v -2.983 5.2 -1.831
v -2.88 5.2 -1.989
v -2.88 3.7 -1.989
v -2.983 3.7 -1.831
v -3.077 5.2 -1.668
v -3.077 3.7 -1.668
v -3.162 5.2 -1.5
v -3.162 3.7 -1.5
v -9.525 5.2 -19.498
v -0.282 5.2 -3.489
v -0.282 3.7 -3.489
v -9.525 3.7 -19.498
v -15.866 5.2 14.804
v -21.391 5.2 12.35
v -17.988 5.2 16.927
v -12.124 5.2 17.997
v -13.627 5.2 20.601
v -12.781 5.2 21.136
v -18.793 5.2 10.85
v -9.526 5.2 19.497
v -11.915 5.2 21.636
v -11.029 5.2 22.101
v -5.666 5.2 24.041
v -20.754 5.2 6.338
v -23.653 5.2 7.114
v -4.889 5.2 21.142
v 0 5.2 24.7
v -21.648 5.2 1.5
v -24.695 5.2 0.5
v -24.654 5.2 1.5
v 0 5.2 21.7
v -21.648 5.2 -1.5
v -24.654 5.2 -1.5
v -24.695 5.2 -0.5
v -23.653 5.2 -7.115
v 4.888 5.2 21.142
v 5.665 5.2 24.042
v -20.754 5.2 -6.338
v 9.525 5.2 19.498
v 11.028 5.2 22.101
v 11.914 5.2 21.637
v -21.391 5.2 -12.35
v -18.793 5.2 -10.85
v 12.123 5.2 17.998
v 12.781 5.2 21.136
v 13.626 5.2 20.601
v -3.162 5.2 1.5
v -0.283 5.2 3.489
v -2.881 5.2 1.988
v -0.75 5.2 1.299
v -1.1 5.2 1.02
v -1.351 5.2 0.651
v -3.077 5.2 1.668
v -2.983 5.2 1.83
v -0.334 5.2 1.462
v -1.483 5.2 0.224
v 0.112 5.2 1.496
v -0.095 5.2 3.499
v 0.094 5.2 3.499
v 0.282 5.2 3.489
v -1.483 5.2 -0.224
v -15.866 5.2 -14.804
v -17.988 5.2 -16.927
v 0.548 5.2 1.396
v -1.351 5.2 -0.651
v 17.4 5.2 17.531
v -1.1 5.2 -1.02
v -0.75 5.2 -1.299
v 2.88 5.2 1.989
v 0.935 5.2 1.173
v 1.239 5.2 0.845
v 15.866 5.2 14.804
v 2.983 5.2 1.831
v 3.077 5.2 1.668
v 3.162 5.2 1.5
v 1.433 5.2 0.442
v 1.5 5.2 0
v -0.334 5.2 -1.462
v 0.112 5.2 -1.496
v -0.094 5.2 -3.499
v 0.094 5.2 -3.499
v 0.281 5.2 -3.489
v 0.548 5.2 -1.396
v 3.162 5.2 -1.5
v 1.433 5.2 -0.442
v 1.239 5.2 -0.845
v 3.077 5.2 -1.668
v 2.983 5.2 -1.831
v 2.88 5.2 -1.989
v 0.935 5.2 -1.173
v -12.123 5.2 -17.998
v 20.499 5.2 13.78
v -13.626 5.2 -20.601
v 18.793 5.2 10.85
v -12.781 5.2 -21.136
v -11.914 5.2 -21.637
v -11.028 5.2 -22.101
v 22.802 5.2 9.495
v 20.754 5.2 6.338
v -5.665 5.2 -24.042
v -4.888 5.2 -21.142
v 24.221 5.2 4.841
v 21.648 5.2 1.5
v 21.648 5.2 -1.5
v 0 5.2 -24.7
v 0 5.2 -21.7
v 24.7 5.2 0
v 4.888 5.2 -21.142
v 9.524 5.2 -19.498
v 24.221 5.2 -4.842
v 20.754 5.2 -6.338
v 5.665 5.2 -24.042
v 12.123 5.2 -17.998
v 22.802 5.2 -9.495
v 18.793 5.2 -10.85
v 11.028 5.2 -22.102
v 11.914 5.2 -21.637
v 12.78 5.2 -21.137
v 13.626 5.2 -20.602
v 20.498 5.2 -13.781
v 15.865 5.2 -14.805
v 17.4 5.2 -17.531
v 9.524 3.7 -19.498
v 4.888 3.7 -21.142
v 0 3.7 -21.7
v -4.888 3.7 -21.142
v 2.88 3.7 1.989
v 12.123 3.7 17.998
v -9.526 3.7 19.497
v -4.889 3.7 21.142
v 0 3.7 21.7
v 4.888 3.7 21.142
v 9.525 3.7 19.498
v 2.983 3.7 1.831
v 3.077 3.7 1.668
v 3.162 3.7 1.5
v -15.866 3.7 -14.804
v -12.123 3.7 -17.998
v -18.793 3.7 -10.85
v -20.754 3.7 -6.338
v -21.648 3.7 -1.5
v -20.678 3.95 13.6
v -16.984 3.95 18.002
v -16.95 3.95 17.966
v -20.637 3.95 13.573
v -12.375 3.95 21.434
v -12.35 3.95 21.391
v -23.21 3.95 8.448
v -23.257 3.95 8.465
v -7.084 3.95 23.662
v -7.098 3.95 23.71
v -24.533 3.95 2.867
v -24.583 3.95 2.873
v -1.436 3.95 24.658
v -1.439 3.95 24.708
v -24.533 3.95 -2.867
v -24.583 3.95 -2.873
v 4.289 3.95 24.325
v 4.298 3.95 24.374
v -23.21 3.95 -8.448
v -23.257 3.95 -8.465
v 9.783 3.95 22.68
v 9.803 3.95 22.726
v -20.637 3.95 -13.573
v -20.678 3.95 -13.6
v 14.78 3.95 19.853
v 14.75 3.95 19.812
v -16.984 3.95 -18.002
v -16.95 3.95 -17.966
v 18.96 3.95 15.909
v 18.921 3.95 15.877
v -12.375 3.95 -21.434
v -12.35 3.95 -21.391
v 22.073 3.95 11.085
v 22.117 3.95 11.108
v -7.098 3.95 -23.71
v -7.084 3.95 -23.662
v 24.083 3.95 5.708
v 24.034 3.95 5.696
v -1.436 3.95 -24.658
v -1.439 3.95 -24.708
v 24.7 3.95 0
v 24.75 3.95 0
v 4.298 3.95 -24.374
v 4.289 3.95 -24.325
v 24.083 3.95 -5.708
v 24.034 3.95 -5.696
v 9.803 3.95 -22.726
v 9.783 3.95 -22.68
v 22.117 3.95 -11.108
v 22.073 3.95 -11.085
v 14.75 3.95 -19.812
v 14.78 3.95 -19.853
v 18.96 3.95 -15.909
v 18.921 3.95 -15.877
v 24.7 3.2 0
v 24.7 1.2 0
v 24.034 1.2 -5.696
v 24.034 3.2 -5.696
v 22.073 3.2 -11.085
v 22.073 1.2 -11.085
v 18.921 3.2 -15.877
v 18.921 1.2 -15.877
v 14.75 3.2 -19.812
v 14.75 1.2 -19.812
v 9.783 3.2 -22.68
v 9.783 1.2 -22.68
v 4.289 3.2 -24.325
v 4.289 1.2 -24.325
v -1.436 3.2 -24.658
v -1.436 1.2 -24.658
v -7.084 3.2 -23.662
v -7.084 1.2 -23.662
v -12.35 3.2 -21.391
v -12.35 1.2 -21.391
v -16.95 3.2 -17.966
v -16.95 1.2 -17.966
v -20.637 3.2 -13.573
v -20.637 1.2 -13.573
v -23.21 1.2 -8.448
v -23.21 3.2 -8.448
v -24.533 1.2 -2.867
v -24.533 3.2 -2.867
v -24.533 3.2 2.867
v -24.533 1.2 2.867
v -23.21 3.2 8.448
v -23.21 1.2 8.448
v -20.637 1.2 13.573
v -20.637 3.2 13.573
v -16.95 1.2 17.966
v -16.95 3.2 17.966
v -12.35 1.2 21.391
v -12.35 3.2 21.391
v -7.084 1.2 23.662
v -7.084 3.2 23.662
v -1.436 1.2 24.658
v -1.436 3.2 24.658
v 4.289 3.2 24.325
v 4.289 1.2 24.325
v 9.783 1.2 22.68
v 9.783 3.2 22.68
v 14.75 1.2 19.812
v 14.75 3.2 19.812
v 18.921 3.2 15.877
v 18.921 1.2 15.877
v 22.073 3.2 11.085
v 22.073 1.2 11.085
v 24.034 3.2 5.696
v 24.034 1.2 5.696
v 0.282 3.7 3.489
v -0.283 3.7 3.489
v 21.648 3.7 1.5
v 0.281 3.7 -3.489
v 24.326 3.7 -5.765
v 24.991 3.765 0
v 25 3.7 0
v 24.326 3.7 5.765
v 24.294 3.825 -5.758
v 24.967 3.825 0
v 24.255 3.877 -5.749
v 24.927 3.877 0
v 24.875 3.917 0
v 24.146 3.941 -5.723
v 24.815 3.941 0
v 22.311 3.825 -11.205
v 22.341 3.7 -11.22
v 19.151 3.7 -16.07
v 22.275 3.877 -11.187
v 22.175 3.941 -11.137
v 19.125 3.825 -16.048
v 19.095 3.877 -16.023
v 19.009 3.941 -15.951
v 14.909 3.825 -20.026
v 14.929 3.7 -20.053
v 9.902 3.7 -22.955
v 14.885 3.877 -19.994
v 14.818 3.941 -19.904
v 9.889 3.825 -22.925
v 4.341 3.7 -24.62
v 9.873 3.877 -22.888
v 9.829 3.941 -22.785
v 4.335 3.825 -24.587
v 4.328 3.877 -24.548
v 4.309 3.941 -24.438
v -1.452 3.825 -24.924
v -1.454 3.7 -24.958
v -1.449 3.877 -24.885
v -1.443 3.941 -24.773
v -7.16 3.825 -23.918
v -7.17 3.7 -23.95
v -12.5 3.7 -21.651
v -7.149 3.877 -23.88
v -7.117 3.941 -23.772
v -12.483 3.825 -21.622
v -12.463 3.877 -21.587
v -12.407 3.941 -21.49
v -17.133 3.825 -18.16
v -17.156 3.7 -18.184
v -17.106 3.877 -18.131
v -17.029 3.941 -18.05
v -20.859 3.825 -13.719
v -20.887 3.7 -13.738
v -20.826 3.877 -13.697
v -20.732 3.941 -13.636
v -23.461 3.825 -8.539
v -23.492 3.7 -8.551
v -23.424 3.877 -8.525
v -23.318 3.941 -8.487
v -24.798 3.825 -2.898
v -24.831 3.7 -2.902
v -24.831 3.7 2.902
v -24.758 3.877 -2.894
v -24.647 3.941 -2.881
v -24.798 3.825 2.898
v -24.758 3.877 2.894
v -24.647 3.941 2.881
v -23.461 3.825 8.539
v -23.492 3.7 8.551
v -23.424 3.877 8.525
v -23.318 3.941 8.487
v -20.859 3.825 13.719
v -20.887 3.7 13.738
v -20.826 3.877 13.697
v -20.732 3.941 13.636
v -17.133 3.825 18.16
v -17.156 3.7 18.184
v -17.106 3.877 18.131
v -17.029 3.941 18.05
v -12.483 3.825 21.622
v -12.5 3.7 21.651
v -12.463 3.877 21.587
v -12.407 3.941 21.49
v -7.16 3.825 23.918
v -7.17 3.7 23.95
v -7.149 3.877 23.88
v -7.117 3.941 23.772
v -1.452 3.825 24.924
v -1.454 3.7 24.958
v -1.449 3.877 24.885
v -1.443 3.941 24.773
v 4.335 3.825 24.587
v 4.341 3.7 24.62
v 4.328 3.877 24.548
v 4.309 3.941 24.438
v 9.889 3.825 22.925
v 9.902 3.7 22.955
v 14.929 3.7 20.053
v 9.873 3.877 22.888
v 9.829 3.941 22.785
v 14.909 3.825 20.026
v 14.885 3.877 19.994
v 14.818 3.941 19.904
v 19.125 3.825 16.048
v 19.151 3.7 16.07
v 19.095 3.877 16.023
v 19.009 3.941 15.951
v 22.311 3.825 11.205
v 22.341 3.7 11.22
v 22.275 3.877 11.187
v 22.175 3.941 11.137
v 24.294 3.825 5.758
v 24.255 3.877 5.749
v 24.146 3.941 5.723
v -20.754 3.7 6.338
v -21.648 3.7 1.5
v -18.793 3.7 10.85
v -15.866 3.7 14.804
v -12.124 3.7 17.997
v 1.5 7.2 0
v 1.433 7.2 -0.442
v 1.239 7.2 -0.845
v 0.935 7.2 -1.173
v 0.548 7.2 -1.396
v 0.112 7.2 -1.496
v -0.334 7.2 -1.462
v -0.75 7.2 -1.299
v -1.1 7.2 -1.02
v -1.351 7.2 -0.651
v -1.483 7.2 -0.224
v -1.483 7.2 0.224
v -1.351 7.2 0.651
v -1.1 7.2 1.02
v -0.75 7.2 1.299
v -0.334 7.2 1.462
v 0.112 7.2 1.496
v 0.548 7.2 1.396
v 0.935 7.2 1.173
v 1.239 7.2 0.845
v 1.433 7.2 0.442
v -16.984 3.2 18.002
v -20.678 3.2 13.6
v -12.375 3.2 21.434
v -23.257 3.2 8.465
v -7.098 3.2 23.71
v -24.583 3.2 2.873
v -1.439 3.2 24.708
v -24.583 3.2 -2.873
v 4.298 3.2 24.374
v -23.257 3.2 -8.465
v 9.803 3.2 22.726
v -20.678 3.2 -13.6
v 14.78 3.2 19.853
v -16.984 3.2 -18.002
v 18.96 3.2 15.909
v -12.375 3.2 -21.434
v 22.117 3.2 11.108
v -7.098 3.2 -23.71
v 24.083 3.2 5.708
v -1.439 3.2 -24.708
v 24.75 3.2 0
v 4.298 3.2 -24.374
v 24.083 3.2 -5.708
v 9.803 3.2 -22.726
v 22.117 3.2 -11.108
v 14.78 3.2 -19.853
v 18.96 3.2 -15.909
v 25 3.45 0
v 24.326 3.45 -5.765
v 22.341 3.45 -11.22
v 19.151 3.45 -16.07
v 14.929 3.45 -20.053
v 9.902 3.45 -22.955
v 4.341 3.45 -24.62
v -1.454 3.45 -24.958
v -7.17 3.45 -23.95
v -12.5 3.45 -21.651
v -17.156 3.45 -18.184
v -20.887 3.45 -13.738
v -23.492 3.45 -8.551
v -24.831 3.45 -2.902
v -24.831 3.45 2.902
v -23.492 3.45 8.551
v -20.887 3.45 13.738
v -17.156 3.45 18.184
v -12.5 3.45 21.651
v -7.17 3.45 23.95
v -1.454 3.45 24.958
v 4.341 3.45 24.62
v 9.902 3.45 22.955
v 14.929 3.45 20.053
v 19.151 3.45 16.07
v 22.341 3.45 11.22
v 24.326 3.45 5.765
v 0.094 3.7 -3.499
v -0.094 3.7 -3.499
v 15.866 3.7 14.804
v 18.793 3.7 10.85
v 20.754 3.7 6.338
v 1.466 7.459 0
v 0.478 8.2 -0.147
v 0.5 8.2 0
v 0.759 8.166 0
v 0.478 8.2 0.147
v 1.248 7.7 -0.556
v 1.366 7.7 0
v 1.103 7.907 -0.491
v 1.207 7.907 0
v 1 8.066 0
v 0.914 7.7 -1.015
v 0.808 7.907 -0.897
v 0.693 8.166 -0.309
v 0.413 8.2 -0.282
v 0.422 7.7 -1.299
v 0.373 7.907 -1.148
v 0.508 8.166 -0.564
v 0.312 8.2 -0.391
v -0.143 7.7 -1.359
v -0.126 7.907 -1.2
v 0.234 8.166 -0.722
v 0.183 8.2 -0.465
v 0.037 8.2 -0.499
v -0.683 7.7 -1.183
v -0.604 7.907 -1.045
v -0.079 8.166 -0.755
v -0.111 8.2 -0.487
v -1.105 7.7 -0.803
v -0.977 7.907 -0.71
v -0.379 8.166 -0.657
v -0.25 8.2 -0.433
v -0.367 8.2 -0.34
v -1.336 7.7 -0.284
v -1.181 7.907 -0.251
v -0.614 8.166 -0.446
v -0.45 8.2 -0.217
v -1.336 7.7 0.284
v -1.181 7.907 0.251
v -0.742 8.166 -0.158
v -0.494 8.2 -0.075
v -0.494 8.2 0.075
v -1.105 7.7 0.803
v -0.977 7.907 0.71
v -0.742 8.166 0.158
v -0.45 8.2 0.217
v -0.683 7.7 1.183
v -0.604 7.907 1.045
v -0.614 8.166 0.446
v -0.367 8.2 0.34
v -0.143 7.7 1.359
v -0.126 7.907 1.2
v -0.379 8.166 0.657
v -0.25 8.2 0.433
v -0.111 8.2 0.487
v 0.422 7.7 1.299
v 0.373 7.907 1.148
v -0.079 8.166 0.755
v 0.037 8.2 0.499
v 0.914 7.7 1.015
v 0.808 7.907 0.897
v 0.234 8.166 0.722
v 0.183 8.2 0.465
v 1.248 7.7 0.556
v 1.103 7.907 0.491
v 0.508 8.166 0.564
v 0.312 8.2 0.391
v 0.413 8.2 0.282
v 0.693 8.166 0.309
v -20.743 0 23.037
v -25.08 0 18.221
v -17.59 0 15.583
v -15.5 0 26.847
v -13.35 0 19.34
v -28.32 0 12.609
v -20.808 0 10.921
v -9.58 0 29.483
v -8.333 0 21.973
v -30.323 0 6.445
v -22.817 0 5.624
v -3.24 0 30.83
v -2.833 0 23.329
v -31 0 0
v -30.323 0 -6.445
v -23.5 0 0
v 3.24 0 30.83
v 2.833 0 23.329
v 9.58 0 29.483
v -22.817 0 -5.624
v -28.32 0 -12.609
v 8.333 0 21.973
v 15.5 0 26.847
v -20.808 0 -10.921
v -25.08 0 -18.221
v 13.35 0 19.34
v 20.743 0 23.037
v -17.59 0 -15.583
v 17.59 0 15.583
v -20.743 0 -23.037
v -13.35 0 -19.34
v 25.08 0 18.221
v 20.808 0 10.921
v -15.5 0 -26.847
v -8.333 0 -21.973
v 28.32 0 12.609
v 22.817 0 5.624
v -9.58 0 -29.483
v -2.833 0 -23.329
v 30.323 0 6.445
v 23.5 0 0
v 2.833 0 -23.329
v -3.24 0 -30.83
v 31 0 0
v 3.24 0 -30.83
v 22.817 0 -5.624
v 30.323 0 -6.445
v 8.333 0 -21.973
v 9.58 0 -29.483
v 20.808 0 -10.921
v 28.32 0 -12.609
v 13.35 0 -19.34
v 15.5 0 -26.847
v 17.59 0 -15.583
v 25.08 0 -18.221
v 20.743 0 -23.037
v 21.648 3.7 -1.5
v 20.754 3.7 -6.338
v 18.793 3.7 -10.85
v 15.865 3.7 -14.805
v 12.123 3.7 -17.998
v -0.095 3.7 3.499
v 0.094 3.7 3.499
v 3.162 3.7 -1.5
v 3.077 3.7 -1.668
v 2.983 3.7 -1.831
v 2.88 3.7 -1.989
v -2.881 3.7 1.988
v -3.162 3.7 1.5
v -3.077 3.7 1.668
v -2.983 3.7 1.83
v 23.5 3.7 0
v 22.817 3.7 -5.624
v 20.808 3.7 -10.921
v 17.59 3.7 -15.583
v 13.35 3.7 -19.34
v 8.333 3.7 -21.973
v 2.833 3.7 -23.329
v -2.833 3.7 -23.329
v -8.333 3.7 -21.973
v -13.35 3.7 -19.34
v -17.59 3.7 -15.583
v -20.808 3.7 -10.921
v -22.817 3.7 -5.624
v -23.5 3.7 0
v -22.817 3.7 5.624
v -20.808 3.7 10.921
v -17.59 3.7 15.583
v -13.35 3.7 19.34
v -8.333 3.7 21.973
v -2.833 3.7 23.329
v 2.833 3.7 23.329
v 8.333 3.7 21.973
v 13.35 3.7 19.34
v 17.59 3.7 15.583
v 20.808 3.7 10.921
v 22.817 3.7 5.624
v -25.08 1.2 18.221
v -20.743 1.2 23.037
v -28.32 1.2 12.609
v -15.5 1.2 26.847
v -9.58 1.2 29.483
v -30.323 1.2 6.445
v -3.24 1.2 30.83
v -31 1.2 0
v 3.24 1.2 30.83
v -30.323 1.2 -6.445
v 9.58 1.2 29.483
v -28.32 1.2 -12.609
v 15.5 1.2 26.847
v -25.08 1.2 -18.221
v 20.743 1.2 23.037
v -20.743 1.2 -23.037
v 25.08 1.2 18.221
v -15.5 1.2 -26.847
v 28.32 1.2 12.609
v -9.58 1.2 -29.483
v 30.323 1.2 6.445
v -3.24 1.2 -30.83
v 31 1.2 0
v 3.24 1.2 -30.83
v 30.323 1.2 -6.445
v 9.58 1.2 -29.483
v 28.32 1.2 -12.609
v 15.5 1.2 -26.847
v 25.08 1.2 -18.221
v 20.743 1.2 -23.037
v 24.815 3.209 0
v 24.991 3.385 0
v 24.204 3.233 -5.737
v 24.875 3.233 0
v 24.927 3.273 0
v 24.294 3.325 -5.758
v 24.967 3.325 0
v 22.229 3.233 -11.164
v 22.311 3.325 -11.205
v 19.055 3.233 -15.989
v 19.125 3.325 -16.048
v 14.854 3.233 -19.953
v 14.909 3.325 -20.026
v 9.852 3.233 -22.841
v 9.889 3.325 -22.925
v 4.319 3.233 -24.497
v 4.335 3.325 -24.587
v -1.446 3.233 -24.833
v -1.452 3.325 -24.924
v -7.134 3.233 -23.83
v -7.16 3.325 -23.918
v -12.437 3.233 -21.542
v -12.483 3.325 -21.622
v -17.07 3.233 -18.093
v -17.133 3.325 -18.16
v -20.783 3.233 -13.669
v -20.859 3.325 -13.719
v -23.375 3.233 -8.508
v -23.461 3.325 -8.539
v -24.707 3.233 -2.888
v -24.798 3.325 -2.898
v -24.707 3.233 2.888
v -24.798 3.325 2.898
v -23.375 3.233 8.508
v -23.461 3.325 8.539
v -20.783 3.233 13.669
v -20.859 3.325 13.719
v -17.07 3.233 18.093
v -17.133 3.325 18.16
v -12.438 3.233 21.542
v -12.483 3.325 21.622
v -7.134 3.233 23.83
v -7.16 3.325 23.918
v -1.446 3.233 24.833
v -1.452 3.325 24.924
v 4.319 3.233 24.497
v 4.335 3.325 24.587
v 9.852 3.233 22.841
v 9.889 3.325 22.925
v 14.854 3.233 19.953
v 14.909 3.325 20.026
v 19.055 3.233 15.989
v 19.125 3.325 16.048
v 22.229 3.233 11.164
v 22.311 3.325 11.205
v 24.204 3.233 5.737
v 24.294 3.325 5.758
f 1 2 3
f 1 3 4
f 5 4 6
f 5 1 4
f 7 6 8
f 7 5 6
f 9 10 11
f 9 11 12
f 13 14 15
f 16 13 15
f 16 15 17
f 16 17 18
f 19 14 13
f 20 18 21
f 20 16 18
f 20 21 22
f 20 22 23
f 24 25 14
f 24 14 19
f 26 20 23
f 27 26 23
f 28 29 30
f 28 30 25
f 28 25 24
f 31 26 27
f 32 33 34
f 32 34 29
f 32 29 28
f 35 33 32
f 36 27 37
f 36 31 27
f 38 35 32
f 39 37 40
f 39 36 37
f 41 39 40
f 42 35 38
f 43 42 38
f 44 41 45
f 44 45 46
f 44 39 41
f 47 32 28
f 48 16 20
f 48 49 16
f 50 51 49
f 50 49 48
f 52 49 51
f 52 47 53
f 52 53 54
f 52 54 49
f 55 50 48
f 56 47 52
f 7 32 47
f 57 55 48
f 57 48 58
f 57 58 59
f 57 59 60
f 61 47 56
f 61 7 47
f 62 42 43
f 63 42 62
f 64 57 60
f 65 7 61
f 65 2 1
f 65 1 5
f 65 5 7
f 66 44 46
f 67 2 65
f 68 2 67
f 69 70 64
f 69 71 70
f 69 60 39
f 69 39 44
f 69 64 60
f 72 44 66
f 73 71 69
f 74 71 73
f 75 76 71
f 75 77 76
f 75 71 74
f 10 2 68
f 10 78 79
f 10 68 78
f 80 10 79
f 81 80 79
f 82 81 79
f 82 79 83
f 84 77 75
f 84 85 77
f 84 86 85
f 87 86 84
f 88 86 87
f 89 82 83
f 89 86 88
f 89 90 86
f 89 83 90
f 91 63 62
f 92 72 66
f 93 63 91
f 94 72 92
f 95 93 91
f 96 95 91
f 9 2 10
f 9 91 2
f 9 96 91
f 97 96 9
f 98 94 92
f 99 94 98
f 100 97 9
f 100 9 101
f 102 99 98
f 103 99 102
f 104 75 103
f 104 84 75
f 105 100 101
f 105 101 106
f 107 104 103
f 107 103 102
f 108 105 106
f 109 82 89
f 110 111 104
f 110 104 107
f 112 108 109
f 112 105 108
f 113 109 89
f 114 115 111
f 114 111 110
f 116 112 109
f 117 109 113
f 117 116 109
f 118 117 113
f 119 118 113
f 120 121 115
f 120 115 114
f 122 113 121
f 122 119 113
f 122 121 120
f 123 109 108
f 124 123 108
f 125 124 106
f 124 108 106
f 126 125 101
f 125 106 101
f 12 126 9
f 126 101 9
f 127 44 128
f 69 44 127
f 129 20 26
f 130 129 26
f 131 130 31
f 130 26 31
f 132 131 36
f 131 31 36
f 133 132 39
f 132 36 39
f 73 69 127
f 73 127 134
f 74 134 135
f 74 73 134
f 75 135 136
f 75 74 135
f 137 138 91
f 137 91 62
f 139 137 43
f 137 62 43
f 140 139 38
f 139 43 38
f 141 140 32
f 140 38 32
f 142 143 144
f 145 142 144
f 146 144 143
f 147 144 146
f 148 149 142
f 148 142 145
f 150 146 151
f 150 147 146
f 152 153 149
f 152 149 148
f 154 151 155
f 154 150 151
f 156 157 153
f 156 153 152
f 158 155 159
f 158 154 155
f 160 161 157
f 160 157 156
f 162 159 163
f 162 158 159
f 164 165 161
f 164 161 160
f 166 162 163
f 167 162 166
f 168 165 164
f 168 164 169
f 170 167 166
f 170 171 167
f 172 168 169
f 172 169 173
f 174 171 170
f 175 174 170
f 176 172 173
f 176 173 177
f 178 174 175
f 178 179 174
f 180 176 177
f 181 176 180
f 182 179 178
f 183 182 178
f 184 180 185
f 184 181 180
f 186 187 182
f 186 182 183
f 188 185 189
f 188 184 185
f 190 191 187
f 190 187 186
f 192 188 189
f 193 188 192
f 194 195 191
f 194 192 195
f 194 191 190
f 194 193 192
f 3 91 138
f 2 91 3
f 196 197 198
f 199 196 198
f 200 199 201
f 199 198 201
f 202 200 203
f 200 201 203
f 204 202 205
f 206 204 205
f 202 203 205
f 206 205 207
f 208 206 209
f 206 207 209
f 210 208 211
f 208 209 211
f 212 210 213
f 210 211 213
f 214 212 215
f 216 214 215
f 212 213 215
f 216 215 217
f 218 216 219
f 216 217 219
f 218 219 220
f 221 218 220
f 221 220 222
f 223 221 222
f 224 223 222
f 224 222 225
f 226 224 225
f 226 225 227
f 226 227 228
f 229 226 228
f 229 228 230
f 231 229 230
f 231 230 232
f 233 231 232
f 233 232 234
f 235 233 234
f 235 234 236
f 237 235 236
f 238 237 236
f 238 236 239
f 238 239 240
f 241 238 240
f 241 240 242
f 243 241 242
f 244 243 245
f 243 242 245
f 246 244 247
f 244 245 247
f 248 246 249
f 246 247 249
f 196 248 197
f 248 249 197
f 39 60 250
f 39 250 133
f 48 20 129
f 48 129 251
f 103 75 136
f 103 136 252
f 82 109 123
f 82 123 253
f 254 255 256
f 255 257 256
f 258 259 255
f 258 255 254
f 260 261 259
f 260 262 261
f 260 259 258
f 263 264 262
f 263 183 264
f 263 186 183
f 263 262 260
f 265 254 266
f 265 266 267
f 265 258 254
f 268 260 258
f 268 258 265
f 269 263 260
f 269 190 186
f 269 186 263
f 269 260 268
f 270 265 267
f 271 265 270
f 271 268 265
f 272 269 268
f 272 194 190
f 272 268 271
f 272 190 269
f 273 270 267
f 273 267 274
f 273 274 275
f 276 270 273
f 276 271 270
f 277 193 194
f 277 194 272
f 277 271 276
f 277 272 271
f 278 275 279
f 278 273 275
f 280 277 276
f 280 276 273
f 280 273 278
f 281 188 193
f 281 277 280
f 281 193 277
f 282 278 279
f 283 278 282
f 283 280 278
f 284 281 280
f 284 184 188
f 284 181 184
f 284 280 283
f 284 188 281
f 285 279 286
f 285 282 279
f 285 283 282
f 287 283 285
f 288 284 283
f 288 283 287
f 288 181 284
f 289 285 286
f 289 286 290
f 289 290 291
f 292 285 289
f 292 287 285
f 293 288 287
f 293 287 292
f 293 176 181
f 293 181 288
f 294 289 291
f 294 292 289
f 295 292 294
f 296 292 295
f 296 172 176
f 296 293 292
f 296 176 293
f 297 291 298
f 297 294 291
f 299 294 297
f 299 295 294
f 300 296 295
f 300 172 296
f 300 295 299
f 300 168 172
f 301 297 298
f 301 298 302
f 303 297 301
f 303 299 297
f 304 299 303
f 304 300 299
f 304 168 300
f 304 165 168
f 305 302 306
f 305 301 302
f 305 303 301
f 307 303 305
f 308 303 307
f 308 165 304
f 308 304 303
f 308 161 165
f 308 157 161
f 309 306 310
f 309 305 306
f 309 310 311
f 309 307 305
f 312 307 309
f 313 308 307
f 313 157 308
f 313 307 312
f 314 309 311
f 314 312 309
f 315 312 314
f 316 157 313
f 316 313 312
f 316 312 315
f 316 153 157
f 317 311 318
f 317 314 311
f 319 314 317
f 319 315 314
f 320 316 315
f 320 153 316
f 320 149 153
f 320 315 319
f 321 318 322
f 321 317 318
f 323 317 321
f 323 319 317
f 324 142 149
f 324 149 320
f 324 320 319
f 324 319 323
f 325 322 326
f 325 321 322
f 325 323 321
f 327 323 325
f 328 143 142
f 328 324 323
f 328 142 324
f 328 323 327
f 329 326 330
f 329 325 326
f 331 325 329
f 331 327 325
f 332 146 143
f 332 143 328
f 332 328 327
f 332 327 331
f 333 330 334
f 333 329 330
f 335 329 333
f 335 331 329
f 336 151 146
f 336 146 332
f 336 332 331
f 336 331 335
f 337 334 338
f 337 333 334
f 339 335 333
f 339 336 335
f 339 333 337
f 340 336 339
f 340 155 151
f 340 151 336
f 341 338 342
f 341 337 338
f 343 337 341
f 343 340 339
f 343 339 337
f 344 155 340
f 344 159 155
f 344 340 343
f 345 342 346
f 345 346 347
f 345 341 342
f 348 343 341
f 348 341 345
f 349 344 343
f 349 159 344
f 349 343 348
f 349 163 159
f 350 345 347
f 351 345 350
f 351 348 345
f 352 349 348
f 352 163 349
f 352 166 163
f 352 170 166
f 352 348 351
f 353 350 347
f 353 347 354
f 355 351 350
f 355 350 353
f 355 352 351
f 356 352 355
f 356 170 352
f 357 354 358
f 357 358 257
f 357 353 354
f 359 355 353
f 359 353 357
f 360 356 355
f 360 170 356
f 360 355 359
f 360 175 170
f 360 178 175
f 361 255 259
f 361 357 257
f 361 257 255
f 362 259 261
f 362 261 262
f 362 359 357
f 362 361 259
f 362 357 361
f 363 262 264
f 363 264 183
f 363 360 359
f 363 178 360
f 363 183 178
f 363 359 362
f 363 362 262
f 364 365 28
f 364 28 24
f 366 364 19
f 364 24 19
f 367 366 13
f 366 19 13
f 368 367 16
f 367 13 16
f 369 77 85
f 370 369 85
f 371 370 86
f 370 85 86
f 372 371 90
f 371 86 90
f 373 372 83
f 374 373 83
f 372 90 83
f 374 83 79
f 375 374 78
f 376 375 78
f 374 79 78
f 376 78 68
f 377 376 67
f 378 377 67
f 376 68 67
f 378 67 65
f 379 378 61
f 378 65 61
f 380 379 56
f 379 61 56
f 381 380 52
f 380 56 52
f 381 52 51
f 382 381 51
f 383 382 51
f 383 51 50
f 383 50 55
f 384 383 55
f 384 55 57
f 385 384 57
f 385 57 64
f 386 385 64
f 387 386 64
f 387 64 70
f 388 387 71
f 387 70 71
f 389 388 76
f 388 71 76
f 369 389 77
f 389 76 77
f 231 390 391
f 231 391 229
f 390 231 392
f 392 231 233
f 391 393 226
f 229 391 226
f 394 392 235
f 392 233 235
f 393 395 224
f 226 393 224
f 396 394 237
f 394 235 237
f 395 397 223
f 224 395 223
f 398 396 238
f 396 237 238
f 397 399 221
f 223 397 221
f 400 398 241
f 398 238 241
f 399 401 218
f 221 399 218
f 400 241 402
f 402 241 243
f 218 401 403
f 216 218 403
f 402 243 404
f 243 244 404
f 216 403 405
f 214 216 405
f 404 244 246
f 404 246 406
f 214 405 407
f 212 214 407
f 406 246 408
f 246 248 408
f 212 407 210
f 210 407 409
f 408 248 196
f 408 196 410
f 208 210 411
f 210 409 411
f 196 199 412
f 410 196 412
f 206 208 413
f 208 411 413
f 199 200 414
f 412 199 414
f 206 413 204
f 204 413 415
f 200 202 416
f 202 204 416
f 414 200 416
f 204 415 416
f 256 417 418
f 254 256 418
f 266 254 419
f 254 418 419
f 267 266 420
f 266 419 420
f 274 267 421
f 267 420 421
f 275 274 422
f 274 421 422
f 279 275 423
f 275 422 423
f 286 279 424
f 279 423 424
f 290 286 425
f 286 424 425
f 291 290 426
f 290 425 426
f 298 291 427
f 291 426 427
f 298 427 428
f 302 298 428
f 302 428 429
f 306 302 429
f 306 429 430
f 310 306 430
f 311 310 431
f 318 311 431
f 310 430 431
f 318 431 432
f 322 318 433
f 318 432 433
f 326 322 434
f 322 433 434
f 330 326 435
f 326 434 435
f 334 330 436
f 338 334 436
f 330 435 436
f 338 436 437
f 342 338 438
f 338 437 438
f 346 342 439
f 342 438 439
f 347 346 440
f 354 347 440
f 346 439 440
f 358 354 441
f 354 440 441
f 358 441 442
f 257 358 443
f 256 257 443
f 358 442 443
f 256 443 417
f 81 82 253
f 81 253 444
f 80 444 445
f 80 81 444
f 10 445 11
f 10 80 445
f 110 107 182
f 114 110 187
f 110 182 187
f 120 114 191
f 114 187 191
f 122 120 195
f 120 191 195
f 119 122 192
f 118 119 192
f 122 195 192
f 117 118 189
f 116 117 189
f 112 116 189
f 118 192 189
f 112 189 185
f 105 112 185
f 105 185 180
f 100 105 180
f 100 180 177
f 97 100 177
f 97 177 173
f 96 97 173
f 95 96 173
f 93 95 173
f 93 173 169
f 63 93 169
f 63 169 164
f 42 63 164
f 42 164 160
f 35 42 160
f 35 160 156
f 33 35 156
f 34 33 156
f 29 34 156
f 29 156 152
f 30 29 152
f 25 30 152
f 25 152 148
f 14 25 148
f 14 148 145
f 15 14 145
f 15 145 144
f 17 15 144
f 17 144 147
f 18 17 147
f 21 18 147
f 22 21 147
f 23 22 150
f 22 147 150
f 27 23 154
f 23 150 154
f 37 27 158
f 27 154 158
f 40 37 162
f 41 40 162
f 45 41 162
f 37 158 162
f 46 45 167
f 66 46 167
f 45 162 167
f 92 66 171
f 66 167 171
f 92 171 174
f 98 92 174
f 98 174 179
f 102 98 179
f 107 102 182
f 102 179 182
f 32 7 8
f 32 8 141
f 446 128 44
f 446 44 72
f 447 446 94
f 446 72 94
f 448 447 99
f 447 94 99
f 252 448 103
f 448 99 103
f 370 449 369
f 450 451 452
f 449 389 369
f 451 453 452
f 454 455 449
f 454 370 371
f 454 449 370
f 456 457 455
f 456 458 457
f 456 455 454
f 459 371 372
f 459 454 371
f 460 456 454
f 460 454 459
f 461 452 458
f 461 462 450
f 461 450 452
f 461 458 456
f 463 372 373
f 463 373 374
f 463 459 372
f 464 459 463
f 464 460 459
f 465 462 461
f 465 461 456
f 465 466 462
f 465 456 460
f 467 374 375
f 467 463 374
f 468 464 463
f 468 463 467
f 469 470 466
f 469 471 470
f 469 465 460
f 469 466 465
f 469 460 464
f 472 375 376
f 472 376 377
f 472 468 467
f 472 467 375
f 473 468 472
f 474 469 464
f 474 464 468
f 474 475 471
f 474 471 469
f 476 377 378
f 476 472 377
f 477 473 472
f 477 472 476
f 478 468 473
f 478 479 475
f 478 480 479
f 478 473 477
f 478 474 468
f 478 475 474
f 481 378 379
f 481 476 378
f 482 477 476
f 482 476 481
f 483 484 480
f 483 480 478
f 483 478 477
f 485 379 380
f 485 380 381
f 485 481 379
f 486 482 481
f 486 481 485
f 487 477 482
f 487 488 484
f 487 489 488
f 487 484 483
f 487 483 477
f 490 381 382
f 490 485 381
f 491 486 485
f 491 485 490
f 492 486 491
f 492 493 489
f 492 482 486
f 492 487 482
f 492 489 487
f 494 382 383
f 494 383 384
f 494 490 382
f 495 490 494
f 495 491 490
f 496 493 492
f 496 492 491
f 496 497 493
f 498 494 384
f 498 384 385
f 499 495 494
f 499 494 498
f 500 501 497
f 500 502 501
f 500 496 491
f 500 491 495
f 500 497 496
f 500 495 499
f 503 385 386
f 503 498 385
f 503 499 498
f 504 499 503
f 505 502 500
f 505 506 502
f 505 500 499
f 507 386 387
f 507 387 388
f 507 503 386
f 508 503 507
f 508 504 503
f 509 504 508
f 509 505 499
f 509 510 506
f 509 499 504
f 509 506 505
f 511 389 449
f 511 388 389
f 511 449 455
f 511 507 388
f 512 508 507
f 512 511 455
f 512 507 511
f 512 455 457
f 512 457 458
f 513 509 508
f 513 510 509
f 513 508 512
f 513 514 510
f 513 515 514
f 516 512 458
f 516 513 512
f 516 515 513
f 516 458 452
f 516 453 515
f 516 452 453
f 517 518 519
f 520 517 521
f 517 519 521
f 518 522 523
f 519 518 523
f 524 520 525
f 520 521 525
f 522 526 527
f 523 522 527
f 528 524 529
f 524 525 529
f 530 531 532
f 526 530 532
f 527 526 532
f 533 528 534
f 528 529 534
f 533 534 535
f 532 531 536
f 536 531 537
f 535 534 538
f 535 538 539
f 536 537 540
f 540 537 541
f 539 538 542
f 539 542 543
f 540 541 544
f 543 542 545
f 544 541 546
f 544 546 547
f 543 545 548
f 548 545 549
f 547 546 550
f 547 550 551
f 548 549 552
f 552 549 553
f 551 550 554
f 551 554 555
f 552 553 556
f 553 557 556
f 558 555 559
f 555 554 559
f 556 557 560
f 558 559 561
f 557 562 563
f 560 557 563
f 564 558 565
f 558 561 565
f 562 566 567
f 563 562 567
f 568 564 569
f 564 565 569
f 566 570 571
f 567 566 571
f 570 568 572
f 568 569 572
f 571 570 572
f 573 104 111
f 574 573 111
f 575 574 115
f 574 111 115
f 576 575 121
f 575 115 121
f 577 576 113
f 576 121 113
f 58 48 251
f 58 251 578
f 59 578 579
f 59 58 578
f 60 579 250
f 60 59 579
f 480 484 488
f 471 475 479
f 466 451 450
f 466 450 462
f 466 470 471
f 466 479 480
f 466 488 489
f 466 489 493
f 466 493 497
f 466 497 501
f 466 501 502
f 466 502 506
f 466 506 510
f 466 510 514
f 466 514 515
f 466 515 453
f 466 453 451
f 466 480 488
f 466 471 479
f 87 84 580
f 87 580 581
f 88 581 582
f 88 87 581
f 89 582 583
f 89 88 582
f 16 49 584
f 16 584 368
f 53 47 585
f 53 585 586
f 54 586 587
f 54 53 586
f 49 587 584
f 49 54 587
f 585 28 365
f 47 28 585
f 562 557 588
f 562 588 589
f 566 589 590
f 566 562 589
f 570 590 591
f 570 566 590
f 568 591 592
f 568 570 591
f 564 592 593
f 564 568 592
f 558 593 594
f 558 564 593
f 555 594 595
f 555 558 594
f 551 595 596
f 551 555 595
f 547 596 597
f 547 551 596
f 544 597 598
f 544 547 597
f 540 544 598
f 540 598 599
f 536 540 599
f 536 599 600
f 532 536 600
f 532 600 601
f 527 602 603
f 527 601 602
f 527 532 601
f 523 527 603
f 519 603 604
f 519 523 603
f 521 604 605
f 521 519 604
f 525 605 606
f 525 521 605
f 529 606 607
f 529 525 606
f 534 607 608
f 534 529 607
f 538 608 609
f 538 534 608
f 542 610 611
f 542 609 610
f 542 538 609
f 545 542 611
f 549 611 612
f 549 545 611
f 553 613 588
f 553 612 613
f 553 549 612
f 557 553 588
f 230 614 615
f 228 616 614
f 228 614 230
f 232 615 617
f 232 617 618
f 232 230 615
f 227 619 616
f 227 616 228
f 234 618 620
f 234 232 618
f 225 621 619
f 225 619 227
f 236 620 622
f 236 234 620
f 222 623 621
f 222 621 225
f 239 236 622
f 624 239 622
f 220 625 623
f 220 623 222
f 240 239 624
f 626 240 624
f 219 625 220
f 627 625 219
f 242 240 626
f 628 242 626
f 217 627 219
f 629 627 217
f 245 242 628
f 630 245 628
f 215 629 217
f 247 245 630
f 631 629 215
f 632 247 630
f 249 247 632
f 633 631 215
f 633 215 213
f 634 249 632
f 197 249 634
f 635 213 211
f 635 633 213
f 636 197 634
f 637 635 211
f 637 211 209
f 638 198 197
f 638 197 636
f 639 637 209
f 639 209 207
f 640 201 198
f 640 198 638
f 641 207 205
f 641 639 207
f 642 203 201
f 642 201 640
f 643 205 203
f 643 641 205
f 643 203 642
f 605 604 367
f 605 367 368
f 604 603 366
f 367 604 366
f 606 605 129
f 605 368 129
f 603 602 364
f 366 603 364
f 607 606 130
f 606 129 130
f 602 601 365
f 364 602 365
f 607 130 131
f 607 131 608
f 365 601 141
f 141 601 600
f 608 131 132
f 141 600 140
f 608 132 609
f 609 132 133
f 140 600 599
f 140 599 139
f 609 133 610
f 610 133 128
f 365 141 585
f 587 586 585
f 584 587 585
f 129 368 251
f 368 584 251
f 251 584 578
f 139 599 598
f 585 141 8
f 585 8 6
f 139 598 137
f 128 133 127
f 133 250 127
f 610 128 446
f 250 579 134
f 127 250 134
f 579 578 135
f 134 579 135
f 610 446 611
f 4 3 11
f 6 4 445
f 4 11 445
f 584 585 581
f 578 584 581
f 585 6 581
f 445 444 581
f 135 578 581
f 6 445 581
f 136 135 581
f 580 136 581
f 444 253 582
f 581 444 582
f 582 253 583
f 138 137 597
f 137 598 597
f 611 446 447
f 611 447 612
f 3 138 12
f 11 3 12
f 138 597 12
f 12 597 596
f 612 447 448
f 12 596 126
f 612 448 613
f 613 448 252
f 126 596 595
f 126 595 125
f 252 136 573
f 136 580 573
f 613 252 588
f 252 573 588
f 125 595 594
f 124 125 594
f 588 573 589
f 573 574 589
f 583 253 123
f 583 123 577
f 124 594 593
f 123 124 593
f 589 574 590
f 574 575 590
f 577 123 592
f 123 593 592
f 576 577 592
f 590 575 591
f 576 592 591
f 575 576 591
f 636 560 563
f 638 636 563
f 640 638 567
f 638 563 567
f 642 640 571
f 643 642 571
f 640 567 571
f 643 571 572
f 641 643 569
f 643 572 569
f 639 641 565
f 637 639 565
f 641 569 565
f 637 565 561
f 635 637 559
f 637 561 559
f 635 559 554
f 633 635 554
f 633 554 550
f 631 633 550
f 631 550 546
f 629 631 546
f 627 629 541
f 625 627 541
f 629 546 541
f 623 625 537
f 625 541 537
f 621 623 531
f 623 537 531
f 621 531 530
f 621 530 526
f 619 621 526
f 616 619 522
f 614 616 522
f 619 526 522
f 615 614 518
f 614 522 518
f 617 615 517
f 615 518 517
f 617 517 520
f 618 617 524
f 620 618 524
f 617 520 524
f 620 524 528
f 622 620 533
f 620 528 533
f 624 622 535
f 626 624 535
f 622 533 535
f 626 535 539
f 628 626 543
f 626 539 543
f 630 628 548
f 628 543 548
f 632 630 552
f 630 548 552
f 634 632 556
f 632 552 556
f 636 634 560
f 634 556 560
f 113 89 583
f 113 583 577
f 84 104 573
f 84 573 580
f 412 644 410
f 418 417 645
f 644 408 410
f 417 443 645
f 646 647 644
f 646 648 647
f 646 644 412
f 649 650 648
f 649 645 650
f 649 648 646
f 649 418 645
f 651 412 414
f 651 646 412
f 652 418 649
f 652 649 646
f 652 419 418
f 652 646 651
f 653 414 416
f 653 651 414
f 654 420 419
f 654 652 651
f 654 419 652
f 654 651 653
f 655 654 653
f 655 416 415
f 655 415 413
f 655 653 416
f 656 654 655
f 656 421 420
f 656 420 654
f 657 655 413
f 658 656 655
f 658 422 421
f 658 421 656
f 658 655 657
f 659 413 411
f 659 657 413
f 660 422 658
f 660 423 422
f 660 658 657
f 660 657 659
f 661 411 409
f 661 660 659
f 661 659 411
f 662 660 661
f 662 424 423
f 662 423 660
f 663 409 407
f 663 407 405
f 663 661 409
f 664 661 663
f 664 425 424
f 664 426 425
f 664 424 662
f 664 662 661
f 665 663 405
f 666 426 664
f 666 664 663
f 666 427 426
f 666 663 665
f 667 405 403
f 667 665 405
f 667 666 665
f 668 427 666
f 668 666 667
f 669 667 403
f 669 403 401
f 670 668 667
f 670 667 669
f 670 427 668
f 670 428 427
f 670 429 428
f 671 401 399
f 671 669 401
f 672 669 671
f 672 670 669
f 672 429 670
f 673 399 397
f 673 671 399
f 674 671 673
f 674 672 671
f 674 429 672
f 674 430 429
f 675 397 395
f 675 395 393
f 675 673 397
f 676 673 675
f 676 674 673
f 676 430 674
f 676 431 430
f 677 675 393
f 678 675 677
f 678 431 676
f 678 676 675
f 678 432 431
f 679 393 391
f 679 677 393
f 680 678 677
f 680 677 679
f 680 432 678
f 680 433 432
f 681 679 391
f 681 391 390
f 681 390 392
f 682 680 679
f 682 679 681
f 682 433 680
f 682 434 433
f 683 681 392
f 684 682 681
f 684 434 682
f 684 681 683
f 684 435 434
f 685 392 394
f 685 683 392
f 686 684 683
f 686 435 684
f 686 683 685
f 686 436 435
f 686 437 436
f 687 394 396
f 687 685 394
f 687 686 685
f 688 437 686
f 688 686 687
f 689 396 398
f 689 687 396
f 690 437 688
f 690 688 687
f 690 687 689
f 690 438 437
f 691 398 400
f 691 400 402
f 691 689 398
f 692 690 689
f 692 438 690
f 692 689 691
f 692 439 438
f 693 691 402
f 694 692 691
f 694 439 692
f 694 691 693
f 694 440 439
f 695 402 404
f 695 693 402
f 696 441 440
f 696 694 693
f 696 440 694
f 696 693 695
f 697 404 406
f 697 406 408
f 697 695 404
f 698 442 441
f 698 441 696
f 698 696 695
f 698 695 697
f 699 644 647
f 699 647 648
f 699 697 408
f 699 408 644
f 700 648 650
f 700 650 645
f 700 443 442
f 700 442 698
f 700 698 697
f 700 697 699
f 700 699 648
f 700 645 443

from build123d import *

# Parameters (mm, degrees)
SKETCH1_R           = 31
SKETCH1_R_2         = 23.5
BOSS_EXTRUDE1_DEPTH = 1.2
SKETCH2_R           = 24.7
SKETCH2_R_2         = 23.5
BOSS_EXTRUDE2_DEPTH = 4
BOSS_EXTRUDE3_START = -2
SKETCH3_R           = 25
SKETCH3_R_2         = 24.7
BOSS_EXTRUDE3_DEPTH = 0.75
FILLET1_R           = 0.25
BOSS_EXTRUDE4_DEPTH = 1.5
SKETCH5_R           = 24.7
SKETCH5_R_2         = 21.7
BOSS_EXTRUDE5_DEPTH = 1.5
SKETCH6_R           = 1.5
BOSS_EXTRUDE6_DEPTH = 3
FILLET2_R           = 1


with BuildPart() as part:
    # Sketch1 → Boss-Extrude1 (new body)
    with BuildSketch(Plane(origin=(0, 0, 0), x_dir=(1, 0, 0), z_dir=(0, 1, 0))):
        Circle(SKETCH1_R)
        Circle(SKETCH1_R_2, mode=Mode.SUBTRACT)
    extrude(amount=BOSS_EXTRUDE1_DEPTH)

    # Sketch2 → Boss-Extrude2 (add)
    with BuildSketch(Plane(origin=(0, 1.2, 0), x_dir=(1, 0, 0), z_dir=(0, 1, 0))):
        Circle(SKETCH2_R)
        Circle(SKETCH2_R_2, mode=Mode.SUBTRACT)
    extrude(amount=BOSS_EXTRUDE2_DEPTH)

    # Sketch3 → Boss-Extrude3 (add)
    with BuildSketch(Plane(origin=(0, 5.2, 0), x_dir=(1, 0, 0), z_dir=(0, 1, 0)).offset(BOSS_EXTRUDE3_START)):
        Circle(SKETCH3_R)
        Circle(SKETCH3_R_2, mode=Mode.SUBTRACT)
    extrude(amount=BOSS_EXTRUDE3_DEPTH)

    # Fillet1
    fillet1_edges = [part.edges().sort_by_distance(p)[0] for p in [
        (-25, 3.95, 0),
        (-25, 3.2, 0),
    ]]
    fillet(fillet1_edges, radius=FILLET1_R)

    # Sketch4 → Boss-Extrude4 (add)
    with BuildSketch(Plane(origin=(0, 5.2, 0), x_dir=(1, 0, 0), z_dir=(0, 1, 0))):
        with BuildLine():
            ThreePointArc((11.028167579, -22.101346562), (12.35, -21.390827473), (13.626243791, -20.601346562))
            Line((13.626243791, -20.601346562), (2.880176936, -1.988612788))
            ThreePointArc((2.880176936, -1.988612788), (3.031088913, -1.75), (3.16227766, -1.5))
            Line((3.16227766, -1.5), (24.65441137, -1.5))
            ThreePointArc((24.65441137, -1.5), (24.7, 0), (24.65441137, 1.5))
            Line((24.65441137, 1.5), (3.16227766, 1.5))
            ThreePointArc((3.16227766, 1.5), (3.030897524, 1.750331453), (2.879741939, 1.989242662))
            Line((2.879741939, 1.989242662), (13.625665835, 20.601728824))
            ThreePointArc((13.625665835, 20.601728824), (12.349399896, 21.391173932), (11.027547542, 22.101655938))
            Line((11.027547542, 22.101655938), (0.281337646, 3.488674409))
            ThreePointArc((0.281337646, 3.488674409), (-0.000382781, 3.499999979), (-0.282100724, 3.488612788))
            Line((-0.282100724, 3.488612788), (-11.028167579, 22.101346562))
            ThreePointArc((-11.028167579, 22.101346562), (-12.35, 21.390827473), (-13.626243791, 20.601346562))
            Line((-13.626243791, 20.601346562), (-2.880176936, 1.988612788))
            ThreePointArc((-2.880176936, 1.988612788), (-3.031088913, 1.75), (-3.16227766, 1.5))
            Line((-3.16227766, 1.5), (-24.65441137, 1.5))
            ThreePointArc((-24.65441137, 1.5), (-24.7, 0), (-24.65441137, -1.5))
            Line((-24.65441137, -1.5), (-3.16227766, -1.5))
            ThreePointArc((-3.16227766, -1.5), (-3.031280286, -1.749668491), (-2.88061184, -1.987982753))
            Line((-2.88061184, -1.987982753), (-13.626821737, -20.600964282))
            ThreePointArc((-13.626821737, -20.600964282), (-12.350600094, -21.390480998), (-11.028787606, -22.101037169))
            Line((-11.028787606, -22.101037169), (-0.28286371, -3.488551006))
            ThreePointArc((-0.28286371, -3.488551006), (-0.000382741, -3.499999979), (0.282100724, -3.488612788))
            Line((0.282100724, -3.488612788), (11.028167579, -22.101346562))
        make_face()
    extrude(amount=-BOSS_EXTRUDE4_DEPTH)

    # Sketch5 → Boss-Extrude5 (add)
    with BuildSketch(Plane(origin=(0, 5.2, 0), x_dir=(1, 0, 0), z_dir=(0, 1, 0))):
        Circle(SKETCH5_R)
        Circle(SKETCH5_R_2, mode=Mode.SUBTRACT)
    extrude(amount=-BOSS_EXTRUDE5_DEPTH)

    # Sketch6 → Boss-Extrude6 (add)
    with BuildSketch(Plane(origin=(0, 5.2, 0), x_dir=(1, 0, 0), z_dir=(0, 1, 0))):
        Circle(SKETCH6_R)
    extrude(amount=BOSS_EXTRUDE6_DEPTH)

    # Fillet2
    fillet2_edges = [part.edges().sort_by_distance(p)[0] for p in [
        (-1.5, 8.2, 0),
    ]]
    fillet(fillet2_edges, radius=FILLET2_R)


solid = part.part
